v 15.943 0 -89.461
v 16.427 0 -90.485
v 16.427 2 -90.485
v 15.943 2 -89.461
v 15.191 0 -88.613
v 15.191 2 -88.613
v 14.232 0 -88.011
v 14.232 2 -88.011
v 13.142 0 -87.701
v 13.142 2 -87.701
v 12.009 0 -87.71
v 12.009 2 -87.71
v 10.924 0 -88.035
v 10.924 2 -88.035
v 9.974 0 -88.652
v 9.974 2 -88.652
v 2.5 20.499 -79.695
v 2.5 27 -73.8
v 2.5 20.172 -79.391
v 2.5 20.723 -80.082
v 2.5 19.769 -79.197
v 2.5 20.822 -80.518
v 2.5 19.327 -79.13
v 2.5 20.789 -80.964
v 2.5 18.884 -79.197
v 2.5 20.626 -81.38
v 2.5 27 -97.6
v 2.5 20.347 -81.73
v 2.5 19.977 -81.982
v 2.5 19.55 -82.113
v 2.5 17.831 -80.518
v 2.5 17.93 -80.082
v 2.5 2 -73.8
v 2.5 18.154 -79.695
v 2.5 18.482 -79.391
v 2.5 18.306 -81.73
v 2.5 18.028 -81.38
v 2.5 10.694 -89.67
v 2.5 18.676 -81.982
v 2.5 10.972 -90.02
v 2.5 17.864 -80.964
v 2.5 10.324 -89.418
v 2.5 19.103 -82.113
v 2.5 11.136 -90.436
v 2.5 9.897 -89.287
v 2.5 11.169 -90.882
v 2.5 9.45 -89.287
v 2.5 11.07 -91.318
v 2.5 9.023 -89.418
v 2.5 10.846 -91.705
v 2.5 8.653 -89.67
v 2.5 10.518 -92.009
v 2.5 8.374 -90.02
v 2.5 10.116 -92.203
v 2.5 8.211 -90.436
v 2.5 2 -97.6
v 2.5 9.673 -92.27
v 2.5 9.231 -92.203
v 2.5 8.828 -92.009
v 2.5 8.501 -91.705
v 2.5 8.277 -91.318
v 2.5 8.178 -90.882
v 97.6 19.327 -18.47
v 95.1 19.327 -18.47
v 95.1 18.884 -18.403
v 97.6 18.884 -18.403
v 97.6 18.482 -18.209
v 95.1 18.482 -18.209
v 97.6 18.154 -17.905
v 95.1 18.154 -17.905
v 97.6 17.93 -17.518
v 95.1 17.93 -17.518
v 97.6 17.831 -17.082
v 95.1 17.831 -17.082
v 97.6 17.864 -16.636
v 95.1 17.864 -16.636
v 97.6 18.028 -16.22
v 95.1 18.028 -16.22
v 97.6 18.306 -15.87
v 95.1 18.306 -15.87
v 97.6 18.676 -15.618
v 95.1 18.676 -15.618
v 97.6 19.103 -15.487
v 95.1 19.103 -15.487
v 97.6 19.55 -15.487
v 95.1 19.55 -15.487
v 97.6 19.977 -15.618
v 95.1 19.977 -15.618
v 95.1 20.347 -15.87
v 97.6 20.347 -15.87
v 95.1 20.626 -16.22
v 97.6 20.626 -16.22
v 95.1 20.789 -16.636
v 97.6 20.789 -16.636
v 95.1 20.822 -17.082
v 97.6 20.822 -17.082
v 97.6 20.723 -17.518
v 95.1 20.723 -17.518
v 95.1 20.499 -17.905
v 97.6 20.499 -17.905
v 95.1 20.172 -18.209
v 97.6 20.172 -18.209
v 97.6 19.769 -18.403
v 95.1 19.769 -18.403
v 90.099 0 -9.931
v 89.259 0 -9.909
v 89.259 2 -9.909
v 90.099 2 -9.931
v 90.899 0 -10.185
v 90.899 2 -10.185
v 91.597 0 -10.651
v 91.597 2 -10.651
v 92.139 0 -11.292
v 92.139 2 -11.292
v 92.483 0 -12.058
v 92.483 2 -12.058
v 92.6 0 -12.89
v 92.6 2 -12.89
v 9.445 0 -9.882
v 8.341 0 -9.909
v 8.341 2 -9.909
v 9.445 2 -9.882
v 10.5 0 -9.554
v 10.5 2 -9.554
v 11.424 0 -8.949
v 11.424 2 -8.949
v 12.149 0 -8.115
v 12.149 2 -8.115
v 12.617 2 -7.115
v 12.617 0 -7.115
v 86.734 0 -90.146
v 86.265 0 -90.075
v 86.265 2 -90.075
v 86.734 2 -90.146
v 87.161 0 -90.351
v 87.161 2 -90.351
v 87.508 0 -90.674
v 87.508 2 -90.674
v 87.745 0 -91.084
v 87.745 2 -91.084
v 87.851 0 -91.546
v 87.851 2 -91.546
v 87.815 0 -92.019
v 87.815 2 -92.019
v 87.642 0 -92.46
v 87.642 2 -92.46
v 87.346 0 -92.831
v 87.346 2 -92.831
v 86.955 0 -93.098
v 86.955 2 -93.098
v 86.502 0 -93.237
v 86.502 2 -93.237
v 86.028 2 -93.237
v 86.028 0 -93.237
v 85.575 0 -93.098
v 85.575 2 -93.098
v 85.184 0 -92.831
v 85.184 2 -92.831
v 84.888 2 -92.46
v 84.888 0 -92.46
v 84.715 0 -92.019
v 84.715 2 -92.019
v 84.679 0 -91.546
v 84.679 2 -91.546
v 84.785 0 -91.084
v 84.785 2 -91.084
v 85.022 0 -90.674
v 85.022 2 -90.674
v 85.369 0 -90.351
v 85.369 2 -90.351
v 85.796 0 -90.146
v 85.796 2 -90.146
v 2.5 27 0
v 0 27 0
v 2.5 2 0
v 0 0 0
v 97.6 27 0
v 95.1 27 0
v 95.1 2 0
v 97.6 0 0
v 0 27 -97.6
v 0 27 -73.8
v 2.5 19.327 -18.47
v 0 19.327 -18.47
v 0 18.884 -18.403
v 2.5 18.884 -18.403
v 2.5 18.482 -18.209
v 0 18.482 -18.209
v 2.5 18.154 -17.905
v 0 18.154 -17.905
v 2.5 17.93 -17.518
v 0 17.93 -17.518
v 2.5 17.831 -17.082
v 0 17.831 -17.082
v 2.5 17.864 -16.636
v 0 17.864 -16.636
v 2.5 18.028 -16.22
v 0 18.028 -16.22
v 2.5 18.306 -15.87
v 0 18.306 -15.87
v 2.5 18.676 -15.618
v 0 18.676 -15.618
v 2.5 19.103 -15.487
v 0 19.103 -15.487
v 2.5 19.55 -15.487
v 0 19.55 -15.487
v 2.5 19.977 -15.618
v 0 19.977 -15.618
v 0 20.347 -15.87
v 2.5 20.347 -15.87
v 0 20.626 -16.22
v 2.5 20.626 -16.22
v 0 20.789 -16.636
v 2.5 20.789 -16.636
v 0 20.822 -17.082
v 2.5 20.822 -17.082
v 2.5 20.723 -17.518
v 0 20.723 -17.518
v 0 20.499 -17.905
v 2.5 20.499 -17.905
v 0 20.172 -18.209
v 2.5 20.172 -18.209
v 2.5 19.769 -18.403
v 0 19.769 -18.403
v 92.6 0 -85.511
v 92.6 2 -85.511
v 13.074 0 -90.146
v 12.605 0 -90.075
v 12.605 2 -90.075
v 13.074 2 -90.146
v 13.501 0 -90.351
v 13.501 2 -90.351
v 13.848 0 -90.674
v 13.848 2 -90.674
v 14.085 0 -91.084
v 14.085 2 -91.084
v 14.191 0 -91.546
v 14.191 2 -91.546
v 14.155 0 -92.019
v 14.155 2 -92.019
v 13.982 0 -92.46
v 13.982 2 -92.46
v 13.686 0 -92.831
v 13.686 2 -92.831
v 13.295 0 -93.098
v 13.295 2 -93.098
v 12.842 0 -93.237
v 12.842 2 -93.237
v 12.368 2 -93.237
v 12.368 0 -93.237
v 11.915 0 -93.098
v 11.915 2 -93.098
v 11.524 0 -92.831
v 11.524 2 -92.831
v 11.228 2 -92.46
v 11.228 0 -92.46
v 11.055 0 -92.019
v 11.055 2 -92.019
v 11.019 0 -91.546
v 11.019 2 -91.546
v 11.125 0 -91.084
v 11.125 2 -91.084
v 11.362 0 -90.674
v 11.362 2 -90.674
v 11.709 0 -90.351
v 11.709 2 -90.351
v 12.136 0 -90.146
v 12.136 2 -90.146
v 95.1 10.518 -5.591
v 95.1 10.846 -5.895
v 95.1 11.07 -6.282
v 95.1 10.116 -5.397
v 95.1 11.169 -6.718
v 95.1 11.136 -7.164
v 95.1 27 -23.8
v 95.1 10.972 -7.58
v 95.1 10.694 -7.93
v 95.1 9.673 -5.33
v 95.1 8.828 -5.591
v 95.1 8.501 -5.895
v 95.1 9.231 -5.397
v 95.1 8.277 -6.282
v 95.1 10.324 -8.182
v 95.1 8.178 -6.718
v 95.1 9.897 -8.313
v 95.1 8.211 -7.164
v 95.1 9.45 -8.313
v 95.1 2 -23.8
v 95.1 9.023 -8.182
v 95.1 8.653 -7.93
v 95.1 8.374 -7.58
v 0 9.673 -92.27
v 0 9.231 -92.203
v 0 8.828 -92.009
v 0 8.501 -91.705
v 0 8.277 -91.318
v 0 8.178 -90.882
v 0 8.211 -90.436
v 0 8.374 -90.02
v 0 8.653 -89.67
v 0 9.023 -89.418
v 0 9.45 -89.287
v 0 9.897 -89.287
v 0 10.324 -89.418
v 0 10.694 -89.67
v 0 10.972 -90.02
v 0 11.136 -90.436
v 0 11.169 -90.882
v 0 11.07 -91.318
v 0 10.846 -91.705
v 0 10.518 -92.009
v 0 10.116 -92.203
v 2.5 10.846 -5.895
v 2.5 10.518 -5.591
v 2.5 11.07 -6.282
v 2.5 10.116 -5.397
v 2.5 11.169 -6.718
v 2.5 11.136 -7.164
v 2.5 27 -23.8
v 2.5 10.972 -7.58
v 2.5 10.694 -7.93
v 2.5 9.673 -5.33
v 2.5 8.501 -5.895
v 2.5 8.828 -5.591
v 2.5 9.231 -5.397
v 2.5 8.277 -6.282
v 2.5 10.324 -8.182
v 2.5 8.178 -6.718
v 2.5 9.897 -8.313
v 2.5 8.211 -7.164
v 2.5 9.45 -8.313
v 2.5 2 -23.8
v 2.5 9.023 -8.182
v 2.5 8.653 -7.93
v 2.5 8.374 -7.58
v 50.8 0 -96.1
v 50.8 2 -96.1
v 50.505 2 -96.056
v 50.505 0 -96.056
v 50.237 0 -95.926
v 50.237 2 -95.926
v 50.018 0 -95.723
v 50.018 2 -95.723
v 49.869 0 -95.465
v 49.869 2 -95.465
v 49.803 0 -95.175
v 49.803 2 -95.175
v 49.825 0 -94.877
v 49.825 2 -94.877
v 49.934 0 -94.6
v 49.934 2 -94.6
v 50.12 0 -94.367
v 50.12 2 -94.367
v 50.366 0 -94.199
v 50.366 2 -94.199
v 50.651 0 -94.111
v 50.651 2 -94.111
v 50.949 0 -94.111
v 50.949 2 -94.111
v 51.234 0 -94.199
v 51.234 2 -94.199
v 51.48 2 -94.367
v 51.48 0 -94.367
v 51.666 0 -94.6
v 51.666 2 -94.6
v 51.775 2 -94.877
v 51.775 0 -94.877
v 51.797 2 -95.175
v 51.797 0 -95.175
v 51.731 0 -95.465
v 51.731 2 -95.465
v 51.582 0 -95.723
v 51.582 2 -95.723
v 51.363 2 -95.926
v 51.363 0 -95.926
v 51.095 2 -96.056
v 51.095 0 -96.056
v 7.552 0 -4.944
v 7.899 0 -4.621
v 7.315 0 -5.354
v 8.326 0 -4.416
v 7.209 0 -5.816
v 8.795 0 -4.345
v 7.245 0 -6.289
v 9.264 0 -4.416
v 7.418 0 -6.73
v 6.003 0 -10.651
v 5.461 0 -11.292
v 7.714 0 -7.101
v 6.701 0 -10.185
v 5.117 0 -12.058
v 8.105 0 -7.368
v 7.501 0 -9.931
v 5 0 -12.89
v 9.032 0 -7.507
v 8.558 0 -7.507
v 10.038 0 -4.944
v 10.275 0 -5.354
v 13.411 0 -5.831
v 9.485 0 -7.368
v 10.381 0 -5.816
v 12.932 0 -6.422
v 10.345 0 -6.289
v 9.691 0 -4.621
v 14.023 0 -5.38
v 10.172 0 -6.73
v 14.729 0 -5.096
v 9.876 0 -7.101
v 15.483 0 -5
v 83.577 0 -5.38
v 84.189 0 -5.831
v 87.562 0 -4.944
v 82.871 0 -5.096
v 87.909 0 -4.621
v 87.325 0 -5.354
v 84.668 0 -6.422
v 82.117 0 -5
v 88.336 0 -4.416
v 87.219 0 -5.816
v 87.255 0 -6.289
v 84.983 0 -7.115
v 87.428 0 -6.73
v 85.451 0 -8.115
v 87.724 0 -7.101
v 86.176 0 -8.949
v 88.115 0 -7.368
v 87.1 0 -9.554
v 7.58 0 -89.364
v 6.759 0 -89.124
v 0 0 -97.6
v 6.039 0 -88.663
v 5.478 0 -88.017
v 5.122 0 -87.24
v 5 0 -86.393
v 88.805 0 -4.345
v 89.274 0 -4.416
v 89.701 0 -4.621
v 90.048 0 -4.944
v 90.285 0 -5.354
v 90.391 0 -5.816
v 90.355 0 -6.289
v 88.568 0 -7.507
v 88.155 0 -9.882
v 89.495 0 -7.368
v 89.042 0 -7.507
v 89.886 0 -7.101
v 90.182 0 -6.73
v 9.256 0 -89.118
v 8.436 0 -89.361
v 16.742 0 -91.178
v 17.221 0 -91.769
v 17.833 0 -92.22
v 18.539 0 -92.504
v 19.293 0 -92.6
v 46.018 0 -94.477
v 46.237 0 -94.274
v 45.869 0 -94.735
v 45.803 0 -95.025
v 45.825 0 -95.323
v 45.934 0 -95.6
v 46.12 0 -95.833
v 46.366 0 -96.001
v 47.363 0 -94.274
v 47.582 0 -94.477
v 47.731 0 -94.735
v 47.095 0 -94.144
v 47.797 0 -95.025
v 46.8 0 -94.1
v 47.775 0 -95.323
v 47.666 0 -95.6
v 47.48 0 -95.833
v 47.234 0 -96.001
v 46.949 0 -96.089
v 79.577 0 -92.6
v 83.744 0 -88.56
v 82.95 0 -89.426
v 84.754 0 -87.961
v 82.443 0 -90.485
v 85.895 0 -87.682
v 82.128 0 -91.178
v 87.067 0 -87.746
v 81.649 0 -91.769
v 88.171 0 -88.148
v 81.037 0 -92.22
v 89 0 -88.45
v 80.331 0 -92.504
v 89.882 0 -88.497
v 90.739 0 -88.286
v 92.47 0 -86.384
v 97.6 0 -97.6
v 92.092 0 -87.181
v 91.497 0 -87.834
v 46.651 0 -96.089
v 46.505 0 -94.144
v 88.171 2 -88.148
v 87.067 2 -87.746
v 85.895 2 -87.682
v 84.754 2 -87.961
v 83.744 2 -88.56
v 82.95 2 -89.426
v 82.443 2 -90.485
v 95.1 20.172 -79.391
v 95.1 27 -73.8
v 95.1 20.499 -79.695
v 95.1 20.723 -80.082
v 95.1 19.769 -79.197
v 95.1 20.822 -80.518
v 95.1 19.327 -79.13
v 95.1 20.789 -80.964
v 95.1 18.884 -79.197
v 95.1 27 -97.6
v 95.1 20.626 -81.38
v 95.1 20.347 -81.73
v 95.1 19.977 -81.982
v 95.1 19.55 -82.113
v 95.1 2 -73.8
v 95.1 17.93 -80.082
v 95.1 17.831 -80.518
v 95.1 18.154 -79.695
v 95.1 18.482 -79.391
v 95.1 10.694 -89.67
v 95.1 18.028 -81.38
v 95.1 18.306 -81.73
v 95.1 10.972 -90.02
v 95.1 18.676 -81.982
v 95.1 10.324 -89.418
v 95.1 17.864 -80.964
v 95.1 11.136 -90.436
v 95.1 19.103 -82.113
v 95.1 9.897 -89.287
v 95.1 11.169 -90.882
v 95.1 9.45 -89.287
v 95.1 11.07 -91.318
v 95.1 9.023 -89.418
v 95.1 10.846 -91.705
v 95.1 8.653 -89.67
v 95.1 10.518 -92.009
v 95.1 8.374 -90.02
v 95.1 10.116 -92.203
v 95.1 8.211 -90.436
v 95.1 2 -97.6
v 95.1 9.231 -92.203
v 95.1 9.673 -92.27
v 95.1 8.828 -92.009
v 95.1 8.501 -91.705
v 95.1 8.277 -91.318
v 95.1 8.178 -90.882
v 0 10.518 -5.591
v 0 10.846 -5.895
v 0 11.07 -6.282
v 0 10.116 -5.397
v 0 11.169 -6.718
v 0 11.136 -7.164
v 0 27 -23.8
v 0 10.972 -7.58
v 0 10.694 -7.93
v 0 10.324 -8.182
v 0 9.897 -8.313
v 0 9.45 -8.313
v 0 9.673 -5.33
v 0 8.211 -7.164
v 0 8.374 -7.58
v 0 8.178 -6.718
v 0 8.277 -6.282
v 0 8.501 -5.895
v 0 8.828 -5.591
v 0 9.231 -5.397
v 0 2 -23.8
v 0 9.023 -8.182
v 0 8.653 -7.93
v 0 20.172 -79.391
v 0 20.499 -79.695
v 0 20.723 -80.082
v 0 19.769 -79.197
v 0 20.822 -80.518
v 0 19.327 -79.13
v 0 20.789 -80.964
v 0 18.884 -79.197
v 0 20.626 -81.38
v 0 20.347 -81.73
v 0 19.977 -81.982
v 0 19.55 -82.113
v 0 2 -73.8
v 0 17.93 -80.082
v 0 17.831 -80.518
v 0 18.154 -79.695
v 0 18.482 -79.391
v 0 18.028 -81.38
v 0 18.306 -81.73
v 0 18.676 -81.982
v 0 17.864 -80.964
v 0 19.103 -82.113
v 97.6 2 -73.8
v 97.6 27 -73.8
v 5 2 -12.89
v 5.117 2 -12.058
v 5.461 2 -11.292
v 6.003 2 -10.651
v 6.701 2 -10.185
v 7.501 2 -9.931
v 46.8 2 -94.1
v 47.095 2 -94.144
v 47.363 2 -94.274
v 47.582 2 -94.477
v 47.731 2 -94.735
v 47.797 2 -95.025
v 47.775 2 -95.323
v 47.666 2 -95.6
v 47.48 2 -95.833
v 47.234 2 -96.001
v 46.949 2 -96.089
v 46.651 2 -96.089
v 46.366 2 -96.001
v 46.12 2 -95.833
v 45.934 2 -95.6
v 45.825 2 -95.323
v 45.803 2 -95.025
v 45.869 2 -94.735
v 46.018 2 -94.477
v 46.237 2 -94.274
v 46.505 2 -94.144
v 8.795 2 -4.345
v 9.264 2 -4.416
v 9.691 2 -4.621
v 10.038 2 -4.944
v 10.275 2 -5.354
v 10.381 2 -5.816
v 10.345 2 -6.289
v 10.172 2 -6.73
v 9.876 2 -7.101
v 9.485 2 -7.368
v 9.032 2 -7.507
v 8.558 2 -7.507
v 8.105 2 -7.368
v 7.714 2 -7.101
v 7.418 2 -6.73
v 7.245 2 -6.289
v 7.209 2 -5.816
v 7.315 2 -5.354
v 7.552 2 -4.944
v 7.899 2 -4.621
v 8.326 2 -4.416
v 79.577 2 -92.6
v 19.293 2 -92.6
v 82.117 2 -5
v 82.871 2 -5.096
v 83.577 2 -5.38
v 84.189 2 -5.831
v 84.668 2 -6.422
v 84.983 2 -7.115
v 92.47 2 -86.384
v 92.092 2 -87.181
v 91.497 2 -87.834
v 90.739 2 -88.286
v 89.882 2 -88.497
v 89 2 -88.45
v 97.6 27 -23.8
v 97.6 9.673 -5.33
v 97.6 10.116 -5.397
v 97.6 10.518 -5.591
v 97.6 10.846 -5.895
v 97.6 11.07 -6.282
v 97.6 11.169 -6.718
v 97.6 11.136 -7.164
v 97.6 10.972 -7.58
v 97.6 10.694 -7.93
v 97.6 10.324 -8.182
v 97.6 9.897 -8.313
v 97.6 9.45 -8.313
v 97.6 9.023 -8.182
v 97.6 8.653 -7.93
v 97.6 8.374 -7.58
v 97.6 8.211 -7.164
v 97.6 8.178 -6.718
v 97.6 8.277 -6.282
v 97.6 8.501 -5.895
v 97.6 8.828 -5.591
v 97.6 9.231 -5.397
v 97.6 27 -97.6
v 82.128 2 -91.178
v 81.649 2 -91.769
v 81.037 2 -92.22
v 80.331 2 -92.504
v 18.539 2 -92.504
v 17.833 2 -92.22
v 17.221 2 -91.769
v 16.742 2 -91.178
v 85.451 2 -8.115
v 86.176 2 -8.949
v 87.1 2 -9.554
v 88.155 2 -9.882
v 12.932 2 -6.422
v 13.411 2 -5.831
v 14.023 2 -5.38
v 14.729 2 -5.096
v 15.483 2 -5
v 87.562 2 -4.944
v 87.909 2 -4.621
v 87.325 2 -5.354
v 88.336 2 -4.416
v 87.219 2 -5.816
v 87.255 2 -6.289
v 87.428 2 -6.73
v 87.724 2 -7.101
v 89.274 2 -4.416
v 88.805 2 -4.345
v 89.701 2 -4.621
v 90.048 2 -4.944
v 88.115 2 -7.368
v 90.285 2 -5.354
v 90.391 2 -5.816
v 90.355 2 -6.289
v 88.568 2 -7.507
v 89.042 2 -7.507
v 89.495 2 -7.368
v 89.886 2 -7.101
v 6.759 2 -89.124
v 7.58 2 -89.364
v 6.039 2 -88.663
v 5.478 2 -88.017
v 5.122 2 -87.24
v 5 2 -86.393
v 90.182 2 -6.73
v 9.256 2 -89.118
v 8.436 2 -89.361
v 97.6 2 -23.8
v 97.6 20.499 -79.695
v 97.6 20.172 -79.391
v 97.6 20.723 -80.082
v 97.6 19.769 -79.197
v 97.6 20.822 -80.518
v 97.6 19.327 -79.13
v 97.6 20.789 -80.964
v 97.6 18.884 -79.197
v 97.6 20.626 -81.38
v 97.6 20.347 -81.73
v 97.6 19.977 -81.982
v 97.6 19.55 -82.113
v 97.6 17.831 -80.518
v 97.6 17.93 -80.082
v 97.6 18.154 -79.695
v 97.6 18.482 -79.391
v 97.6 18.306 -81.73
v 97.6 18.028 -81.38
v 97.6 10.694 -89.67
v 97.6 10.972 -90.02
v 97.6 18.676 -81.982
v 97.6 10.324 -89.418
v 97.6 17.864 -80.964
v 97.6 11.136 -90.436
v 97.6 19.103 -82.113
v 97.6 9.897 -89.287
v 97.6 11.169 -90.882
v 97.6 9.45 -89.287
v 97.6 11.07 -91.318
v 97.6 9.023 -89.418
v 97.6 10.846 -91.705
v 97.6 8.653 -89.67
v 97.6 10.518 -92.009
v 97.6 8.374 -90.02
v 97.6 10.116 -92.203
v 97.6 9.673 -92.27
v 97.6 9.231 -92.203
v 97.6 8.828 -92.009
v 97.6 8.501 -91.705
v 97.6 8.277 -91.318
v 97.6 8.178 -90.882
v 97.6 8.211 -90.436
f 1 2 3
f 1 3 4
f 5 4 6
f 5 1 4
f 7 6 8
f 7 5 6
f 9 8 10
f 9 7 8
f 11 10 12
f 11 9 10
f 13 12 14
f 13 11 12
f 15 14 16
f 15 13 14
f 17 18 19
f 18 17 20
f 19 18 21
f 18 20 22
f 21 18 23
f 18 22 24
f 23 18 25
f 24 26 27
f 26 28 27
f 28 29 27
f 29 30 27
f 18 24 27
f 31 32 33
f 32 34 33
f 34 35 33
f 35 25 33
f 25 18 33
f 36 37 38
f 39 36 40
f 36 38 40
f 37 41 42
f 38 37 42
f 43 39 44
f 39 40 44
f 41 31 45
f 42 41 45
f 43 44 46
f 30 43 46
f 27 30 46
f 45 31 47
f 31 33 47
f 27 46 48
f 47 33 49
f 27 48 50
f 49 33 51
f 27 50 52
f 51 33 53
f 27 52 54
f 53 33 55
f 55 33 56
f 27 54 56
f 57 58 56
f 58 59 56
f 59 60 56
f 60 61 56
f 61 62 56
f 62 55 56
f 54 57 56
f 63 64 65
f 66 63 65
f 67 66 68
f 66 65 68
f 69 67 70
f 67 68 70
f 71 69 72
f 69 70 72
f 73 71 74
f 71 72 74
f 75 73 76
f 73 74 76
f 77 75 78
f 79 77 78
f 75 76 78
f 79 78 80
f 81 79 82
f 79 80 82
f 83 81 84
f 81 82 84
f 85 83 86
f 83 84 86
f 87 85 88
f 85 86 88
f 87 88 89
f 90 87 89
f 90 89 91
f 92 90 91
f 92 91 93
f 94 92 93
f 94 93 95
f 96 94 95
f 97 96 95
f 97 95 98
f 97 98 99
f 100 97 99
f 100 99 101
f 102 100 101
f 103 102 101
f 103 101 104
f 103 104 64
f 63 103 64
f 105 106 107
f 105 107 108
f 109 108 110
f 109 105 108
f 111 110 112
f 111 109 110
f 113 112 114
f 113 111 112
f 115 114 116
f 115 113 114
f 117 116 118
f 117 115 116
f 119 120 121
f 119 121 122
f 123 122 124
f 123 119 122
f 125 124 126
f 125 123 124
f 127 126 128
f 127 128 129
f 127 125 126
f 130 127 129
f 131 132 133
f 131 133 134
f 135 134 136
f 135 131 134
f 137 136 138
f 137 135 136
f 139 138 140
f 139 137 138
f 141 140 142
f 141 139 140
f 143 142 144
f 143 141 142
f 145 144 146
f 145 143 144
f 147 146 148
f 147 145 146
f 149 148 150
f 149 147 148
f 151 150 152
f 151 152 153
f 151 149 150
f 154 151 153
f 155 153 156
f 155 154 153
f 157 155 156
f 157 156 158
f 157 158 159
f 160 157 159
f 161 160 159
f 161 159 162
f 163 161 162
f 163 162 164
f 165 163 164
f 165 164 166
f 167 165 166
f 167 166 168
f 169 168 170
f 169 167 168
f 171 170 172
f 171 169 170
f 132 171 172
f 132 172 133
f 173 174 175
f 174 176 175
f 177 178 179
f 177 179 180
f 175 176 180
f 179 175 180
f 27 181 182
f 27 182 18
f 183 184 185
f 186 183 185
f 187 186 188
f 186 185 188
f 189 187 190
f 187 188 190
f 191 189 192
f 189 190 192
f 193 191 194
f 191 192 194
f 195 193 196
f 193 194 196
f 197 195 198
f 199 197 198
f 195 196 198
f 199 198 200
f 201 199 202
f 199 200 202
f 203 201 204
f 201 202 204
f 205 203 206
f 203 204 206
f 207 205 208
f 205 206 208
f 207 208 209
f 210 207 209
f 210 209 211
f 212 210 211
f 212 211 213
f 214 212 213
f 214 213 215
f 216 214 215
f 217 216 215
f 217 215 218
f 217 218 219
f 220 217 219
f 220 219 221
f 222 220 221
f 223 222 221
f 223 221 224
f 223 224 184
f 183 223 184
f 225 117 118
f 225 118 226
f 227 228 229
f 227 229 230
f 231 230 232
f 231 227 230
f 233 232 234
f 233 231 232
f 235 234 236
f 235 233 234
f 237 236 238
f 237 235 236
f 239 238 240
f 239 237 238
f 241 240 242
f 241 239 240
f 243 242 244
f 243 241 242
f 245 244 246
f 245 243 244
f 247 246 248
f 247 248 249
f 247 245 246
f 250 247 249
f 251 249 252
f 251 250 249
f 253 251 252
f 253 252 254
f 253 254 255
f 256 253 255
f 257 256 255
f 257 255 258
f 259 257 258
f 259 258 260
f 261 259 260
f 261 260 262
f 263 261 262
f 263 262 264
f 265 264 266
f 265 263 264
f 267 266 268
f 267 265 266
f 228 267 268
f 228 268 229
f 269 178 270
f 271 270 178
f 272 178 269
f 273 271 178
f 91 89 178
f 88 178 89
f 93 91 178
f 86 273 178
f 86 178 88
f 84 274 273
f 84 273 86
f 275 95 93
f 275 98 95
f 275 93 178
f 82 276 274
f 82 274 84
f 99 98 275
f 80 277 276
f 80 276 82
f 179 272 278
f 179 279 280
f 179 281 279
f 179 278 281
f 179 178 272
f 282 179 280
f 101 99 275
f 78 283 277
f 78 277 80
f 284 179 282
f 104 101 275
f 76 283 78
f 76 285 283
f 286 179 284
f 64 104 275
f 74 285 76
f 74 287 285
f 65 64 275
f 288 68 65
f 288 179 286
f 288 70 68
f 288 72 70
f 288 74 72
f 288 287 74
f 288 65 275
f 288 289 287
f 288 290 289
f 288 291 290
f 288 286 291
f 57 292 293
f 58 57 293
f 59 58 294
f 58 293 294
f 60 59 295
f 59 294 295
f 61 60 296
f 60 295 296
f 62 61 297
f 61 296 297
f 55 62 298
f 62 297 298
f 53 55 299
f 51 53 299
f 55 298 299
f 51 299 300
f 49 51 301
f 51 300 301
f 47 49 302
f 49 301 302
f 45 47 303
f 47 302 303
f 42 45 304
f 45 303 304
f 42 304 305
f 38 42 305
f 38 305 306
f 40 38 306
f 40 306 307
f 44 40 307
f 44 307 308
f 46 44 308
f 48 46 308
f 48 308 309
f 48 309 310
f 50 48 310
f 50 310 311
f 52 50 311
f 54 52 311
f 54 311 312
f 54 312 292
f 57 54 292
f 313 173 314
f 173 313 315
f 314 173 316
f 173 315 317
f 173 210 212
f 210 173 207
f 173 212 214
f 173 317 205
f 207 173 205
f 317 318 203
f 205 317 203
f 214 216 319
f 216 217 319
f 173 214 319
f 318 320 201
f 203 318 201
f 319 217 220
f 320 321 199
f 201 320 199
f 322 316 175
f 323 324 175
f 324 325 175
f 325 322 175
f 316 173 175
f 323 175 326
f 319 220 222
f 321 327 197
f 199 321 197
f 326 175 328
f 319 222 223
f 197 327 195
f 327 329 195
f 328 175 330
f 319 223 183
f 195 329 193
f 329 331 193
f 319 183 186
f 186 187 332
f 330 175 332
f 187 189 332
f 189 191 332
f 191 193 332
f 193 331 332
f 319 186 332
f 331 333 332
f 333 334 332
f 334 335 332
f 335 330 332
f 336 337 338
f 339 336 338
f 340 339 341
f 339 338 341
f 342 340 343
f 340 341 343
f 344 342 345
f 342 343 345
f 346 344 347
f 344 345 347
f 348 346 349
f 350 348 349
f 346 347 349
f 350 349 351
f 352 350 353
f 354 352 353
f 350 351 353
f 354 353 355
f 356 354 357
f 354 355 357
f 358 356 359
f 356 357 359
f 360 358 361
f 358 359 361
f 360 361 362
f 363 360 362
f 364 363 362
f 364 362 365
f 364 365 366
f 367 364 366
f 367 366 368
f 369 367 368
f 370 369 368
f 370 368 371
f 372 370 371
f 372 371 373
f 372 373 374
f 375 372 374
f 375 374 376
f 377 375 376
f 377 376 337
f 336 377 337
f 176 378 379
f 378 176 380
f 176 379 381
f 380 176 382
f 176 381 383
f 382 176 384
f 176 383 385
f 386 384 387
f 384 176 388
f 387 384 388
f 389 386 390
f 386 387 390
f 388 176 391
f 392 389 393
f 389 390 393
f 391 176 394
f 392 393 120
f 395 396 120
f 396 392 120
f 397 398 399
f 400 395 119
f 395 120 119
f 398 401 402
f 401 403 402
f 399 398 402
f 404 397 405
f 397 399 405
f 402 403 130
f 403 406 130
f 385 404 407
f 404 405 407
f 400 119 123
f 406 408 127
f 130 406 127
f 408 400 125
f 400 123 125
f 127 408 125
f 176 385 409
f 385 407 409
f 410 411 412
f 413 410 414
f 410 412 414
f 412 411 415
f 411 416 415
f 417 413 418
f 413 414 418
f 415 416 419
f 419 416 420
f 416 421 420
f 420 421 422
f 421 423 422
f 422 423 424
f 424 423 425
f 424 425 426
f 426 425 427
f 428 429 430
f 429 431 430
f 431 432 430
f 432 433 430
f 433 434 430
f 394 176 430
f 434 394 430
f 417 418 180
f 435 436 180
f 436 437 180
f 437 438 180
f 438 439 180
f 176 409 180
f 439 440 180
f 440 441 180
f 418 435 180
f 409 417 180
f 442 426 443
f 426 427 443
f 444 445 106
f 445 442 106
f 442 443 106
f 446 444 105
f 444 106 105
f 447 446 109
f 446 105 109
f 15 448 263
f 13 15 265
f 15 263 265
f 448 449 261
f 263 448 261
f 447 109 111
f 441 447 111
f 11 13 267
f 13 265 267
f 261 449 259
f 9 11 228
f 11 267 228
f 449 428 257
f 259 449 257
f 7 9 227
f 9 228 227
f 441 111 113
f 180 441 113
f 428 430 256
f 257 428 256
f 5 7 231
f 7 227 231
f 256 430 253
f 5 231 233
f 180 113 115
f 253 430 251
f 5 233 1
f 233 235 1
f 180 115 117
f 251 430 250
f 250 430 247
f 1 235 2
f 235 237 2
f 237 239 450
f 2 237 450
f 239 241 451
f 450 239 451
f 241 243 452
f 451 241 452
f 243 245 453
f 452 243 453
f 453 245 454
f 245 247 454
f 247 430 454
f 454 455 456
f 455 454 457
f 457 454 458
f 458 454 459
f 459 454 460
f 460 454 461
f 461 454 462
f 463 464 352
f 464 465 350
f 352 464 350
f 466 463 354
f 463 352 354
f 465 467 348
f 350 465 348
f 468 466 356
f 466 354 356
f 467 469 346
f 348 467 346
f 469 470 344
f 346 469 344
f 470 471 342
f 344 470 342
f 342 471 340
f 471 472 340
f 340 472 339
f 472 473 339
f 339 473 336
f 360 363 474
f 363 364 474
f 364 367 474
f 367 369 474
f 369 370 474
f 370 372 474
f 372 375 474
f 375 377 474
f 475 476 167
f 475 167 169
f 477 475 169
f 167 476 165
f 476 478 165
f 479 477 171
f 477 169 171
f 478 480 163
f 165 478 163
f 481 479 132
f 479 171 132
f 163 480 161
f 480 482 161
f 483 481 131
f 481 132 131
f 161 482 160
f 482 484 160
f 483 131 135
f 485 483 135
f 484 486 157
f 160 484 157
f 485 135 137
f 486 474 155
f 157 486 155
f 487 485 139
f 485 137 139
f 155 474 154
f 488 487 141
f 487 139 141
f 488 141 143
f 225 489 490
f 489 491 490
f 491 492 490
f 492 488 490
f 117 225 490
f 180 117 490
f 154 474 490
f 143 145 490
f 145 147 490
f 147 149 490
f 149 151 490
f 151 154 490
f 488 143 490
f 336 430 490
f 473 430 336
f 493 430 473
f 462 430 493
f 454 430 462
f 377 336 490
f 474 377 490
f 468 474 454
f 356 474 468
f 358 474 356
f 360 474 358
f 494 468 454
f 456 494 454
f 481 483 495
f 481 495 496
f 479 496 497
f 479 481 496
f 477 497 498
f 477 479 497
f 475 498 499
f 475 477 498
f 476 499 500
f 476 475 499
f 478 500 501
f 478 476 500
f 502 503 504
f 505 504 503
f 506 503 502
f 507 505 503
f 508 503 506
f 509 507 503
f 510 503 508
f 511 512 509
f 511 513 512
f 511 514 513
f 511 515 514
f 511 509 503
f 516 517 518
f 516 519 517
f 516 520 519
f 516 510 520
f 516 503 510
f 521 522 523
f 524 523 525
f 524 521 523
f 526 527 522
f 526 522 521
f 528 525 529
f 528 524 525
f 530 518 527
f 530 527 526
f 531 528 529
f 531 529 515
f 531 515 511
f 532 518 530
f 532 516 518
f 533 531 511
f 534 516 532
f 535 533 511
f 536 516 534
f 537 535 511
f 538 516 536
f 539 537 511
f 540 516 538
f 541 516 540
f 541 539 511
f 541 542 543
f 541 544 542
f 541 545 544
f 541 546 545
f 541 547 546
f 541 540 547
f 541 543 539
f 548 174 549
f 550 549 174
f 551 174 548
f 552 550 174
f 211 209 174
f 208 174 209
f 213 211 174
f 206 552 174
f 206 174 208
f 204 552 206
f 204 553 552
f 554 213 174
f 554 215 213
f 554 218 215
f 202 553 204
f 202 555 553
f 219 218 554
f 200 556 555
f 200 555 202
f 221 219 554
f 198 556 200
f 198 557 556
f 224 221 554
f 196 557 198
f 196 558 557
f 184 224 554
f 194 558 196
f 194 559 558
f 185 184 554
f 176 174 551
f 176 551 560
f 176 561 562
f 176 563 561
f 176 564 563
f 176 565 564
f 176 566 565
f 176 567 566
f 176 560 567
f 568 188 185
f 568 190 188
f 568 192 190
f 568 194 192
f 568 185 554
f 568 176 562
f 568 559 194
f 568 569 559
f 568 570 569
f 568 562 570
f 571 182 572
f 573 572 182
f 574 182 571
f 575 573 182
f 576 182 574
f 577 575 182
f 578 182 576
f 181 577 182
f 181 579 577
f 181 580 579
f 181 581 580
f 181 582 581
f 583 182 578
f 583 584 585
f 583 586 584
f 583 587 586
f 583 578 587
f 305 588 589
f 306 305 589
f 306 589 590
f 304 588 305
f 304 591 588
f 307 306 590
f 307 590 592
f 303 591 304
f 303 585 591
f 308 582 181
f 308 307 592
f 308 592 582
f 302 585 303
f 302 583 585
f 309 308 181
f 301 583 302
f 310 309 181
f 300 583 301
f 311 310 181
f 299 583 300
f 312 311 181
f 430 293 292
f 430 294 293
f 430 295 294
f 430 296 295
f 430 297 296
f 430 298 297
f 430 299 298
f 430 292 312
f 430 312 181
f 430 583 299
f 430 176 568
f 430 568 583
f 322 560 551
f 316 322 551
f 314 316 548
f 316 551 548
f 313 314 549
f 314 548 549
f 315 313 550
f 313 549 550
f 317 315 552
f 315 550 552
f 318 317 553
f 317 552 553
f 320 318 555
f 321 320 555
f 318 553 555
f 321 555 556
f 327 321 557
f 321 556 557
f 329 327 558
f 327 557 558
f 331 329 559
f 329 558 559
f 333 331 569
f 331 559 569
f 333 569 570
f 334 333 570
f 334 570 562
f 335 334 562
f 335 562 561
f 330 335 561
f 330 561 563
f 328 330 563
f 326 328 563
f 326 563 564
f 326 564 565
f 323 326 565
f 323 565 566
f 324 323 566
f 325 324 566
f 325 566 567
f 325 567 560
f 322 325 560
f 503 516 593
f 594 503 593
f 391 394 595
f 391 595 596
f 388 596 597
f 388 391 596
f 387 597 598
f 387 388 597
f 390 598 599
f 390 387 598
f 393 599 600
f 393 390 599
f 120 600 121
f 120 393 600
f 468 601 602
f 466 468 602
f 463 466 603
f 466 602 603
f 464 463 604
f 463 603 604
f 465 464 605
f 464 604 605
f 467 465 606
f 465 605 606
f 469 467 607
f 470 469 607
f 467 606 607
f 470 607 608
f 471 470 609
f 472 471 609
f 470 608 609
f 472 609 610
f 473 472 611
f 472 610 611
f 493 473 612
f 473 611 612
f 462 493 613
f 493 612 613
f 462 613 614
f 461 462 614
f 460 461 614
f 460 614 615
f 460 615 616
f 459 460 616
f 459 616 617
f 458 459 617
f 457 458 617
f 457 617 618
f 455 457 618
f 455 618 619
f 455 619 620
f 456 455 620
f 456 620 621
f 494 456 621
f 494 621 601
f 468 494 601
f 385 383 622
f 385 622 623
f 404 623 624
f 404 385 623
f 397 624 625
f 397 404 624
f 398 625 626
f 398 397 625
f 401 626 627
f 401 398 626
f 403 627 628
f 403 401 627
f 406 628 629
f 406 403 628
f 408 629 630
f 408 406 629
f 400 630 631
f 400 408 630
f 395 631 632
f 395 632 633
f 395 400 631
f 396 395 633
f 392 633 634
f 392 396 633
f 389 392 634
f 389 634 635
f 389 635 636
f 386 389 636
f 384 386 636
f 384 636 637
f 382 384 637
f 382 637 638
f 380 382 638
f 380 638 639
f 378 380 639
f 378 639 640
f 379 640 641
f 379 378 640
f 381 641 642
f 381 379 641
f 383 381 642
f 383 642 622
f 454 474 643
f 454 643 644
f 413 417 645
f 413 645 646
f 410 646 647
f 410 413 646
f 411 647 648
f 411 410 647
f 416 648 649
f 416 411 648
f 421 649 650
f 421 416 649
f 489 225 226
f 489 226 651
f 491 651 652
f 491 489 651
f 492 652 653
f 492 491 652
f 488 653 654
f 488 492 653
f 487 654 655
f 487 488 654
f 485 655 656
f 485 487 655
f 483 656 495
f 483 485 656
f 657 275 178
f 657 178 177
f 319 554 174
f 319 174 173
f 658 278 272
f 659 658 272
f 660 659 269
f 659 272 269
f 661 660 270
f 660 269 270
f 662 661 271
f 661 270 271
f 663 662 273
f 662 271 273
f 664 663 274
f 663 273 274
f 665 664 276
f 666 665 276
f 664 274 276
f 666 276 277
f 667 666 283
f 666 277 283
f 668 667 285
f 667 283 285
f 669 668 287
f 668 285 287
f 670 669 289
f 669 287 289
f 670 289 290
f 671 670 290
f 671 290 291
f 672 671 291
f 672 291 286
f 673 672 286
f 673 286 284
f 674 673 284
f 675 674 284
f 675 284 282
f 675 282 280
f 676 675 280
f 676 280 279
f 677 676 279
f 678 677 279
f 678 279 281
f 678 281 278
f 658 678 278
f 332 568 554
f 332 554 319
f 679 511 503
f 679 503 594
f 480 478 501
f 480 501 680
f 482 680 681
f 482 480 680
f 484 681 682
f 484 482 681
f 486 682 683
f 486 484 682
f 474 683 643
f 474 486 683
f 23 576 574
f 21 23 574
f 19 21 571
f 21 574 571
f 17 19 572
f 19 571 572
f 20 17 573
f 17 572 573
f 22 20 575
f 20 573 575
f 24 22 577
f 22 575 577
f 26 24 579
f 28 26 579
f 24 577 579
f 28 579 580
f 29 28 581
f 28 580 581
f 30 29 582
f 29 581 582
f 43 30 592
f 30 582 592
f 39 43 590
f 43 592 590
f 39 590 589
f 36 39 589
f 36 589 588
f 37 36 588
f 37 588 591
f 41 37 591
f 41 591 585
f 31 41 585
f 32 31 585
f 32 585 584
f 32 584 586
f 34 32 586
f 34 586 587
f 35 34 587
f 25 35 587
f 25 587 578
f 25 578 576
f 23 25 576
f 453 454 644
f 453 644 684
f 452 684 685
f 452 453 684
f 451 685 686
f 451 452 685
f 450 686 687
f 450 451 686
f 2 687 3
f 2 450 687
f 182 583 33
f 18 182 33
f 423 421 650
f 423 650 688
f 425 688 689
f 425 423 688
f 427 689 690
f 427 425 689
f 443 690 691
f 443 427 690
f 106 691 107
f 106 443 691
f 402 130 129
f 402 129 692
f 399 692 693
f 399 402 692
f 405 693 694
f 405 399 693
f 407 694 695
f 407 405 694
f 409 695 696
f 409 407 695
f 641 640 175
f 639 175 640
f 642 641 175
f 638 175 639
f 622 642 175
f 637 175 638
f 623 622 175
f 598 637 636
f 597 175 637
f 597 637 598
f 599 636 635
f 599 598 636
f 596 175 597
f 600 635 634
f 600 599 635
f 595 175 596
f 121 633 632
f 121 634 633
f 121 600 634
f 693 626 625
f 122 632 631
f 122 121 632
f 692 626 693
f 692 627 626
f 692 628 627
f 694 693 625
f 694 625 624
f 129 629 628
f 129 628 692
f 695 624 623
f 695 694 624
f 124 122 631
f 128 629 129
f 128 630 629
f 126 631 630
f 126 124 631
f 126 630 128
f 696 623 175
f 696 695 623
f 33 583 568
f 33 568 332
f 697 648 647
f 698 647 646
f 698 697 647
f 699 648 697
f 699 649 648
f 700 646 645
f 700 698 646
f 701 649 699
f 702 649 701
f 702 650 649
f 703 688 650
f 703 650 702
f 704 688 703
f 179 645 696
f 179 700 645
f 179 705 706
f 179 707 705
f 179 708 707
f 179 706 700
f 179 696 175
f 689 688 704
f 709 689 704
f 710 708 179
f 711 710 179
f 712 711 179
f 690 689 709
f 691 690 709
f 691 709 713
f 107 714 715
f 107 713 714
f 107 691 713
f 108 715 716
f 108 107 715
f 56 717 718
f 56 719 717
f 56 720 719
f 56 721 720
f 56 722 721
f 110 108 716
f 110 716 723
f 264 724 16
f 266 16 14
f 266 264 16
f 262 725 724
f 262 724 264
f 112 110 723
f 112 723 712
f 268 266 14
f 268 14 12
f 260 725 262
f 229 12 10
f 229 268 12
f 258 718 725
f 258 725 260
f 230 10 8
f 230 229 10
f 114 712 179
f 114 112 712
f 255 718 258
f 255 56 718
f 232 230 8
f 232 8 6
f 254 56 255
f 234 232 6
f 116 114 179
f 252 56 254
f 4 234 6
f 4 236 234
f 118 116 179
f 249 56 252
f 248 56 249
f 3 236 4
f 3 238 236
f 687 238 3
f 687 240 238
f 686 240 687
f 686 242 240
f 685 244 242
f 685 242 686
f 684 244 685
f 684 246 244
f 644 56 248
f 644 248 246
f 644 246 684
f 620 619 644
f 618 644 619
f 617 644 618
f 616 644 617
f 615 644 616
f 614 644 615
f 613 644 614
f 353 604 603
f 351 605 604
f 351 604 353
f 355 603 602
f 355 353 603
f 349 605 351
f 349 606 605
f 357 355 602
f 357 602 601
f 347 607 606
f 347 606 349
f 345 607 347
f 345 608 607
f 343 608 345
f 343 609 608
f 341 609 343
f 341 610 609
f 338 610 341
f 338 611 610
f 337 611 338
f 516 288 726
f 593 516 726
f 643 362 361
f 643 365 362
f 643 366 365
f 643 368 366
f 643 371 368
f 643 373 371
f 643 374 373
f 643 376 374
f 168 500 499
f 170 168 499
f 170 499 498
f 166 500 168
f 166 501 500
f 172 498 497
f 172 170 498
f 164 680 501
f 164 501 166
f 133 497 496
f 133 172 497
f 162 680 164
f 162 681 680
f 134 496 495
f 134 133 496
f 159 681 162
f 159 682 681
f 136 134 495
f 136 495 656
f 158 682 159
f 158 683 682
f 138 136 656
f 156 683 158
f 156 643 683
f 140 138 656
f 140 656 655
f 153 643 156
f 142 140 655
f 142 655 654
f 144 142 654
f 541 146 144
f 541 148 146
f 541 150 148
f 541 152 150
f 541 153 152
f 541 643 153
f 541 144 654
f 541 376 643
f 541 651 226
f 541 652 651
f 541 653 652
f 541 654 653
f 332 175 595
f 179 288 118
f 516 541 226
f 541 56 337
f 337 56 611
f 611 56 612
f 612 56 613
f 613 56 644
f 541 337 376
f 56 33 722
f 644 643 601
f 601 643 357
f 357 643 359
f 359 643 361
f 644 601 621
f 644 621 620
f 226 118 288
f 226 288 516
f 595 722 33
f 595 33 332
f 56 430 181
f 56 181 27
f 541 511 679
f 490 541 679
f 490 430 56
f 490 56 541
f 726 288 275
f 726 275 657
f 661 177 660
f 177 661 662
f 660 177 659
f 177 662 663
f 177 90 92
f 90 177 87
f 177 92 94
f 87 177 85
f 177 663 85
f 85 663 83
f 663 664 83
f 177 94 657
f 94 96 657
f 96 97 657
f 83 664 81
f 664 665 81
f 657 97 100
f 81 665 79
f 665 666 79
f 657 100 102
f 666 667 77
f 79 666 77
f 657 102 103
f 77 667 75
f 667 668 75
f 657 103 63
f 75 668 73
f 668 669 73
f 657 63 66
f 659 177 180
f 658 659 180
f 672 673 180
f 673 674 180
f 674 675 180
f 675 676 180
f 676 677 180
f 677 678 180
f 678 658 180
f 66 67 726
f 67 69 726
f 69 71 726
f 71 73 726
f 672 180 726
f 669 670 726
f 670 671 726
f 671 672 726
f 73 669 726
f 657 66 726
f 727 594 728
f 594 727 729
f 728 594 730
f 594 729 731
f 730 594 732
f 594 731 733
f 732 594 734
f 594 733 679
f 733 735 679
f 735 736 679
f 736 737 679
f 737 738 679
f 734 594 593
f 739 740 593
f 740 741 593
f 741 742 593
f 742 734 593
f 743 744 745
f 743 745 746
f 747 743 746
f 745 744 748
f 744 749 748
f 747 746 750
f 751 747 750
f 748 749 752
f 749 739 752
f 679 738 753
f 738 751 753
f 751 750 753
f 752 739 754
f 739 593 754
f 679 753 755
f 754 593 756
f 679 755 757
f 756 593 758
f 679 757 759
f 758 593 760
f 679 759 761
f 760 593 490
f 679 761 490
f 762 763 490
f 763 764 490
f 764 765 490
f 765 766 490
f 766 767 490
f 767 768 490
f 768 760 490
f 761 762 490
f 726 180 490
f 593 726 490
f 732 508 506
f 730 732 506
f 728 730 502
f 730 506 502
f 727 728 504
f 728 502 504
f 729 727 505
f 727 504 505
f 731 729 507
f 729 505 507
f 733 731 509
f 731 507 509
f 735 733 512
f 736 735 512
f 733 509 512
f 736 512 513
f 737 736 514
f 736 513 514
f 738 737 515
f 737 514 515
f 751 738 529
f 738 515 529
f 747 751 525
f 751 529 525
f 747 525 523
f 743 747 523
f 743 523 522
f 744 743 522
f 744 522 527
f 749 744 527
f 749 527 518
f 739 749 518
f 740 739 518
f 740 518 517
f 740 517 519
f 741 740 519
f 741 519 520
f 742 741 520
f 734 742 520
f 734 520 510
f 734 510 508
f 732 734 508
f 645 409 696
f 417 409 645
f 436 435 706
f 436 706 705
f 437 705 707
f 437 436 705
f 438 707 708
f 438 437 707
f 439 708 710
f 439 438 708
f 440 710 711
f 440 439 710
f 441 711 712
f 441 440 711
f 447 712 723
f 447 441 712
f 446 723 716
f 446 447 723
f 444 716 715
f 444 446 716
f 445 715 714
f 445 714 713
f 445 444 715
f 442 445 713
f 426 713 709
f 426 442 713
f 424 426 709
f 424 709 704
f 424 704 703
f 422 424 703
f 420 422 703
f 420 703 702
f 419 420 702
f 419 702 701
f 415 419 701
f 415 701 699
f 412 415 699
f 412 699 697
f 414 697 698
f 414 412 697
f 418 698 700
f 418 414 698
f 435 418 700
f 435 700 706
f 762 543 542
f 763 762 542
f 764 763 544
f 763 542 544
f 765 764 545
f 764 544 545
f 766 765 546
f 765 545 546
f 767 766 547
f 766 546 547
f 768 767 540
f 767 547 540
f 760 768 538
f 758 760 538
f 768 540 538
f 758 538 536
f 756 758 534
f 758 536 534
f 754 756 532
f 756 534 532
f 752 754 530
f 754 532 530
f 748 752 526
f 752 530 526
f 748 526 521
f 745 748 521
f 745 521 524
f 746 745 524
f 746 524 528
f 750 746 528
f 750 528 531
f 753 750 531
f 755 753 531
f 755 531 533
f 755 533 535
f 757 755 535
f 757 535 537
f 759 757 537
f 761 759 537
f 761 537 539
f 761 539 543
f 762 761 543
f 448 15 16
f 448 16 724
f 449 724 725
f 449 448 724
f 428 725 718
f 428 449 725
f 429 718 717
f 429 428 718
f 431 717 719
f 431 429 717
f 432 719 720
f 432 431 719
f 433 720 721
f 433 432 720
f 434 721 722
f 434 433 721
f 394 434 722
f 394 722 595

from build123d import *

# Parameters (mm, degrees)
SKETCH_1_W          = 97.6
SKETCH_1_H          = 97.6
SKETCH_1_R          = 1.59
EXTRUDE_1_DEPTH     = 2
SKETCH_2_R          = 1
CUT_EXTRUDE_1_DEPTH = 139.04173282
SKETCH_7_W          = 2.5
SKETCH_7_H          = 23.8
EXTRUDE_2_DEPTH     = 25
SKETCH_8_R          = 1.5
CUT_EXTRUDE_2_DEPTH = 141.643236595


with BuildPart() as part:
    # Эскиз1 → Бобышка-Вытянуть1 (new body)
    with BuildSketch(Plane(origin=(0, 0, 0), x_dir=(1, 0, 0), z_dir=(0, 1, 0))):
        with Locations((48.8, 48.8)):
            Rectangle(SKETCH_1_W, SKETCH_1_H)
        with Locations(Location((86.265001451, 91.665000306, 0), (0, 0, 270))):
            Circle(SKETCH_1_R, mode=Mode.SUBTRACT)
        with Locations(Location((88.805001451, 5.935000306, 0), (0, 0, 270))):
            Circle(SKETCH_1_R, mode=Mode.SUBTRACT)
        with Locations(Location((8.795001451, 5.935000306, 0), (0, 0, 270))):
            Circle(SKETCH_1_R, mode=Mode.SUBTRACT)
        with Locations(Location((12.605001451, 91.665000306, 0), (0, 0, 270))):
            Circle(SKETCH_1_R, mode=Mode.SUBTRACT)
        with BuildLine():
            Line((79.576520776, 92.6), (19.293482126, 92.6))
            ThreePointArc((19.293482126, 92.6), (17.512330868, 92.014021582), (16.426990408, 90.485000131))
            ThreePointArc((16.426990408, 90.485000131), (13.697675352, 87.817135476), (9.97357205, 88.652430089))
            ThreePointArc((9.97357205, 88.652430089), (6.759176917, 89.124368033), (5, 86.393002427))
            Line((5, 86.393002427), (5, 12.889708976))
            ThreePointArc((5, 12.889708976), (6.002770009, 10.651166513), (8.340714907, 9.909119546))
            ThreePointArc((8.340714907, 9.909119546), (10.982952752, 9.28356255), (12.616990516, 7.115000131))
            ThreePointArc((12.616990516, 7.115000131), (13.702330946, 5.5859785), (15.483482314, 5))
            Line((15.483482314, 5), (82.116520587, 5))
            ThreePointArc((82.116520587, 5), (83.897671955, 5.5859785), (84.983012386, 7.115000131))
            ThreePointArc((84.983012386, 7.115000131), (86.617049451, 9.283562094), (89.259286336, 9.909119736))
            ThreePointArc((89.259286336, 9.909119736), (91.597230458, 10.651167261), (92.6, 12.889709308))
            Line((92.6, 12.889709308), (92.6, 85.510507258))
            ThreePointArc((92.6, 85.510507258), (91.13495028, 88.088089), (88.170714907, 88.148147136))
            ThreePointArc((88.170714907, 88.148147136), (84.753959284, 87.961386993), (82.443012494, 90.485000131))
            ThreePointArc((82.443012494, 90.485000131), (81.357672034, 92.014021582), (79.576520776, 92.6))
        make_face(mode=Mode.SUBTRACT)
    extrude(amount=EXTRUDE_1_DEPTH)

    # Эскиз2 → Вырез-Вытянуть1 (cut, through all)
    with BuildSketch(Plane(origin=(0, 2, 0), x_dir=(1, 0, 0), z_dir=(0, 1, 0))):
        with Locations(Location((46.8, 95.1, 0), (0, 0, 270))):
            Circle(SKETCH_2_R)
        with Locations(Location((50.8, 95.1, 0), (0, 0, 90))):
            Circle(SKETCH_2_R)
    extrude(amount=-CUT_EXTRUDE_1_DEPTH, mode=Mode.SUBTRACT)

    # Эскиз7 → Бобышка-Вытянуть2 (add)
    with BuildSketch(Plane(origin=(0, 2, 0), x_dir=(1, 0, 0), z_dir=(0, 1, 0))):
        with Locations((1.25, 11.9)):
            Rectangle(SKETCH_7_W, SKETCH_7_H)
        with Locations((1.25, 85.7)):
            Rectangle(SKETCH_7_W, SKETCH_7_H)
        with Locations((96.35, 85.7)):
            Rectangle(SKETCH_7_W, SKETCH_7_H)
        with Locations((96.35, 11.9)):
            Rectangle(SKETCH_7_W, SKETCH_7_H)
    extrude(amount=EXTRUDE_2_DEPTH)

    # Эскиз8 → Вырез-Вытянуть2 (cut, through all)
    with BuildSketch(Plane.ZY):
        with Locations((-80.630070031, 19.32657333)):
            Circle(SKETCH_8_R)
        with Locations(Location((-90.769929969, 9.67342667, 0), (0, 0, 180))):
            Circle(SKETCH_8_R)
        with Locations((-6.830070031, 9.67342667)):
            Circle(SKETCH_8_R)
        with Locations(Location((-16.969929969, 19.32657333, 0), (0, 0, 180))):
            Circle(SKETCH_8_R)
    extrude(amount=-CUT_EXTRUDE_2_DEPTH, mode=Mode.SUBTRACT)


solid = part.part
